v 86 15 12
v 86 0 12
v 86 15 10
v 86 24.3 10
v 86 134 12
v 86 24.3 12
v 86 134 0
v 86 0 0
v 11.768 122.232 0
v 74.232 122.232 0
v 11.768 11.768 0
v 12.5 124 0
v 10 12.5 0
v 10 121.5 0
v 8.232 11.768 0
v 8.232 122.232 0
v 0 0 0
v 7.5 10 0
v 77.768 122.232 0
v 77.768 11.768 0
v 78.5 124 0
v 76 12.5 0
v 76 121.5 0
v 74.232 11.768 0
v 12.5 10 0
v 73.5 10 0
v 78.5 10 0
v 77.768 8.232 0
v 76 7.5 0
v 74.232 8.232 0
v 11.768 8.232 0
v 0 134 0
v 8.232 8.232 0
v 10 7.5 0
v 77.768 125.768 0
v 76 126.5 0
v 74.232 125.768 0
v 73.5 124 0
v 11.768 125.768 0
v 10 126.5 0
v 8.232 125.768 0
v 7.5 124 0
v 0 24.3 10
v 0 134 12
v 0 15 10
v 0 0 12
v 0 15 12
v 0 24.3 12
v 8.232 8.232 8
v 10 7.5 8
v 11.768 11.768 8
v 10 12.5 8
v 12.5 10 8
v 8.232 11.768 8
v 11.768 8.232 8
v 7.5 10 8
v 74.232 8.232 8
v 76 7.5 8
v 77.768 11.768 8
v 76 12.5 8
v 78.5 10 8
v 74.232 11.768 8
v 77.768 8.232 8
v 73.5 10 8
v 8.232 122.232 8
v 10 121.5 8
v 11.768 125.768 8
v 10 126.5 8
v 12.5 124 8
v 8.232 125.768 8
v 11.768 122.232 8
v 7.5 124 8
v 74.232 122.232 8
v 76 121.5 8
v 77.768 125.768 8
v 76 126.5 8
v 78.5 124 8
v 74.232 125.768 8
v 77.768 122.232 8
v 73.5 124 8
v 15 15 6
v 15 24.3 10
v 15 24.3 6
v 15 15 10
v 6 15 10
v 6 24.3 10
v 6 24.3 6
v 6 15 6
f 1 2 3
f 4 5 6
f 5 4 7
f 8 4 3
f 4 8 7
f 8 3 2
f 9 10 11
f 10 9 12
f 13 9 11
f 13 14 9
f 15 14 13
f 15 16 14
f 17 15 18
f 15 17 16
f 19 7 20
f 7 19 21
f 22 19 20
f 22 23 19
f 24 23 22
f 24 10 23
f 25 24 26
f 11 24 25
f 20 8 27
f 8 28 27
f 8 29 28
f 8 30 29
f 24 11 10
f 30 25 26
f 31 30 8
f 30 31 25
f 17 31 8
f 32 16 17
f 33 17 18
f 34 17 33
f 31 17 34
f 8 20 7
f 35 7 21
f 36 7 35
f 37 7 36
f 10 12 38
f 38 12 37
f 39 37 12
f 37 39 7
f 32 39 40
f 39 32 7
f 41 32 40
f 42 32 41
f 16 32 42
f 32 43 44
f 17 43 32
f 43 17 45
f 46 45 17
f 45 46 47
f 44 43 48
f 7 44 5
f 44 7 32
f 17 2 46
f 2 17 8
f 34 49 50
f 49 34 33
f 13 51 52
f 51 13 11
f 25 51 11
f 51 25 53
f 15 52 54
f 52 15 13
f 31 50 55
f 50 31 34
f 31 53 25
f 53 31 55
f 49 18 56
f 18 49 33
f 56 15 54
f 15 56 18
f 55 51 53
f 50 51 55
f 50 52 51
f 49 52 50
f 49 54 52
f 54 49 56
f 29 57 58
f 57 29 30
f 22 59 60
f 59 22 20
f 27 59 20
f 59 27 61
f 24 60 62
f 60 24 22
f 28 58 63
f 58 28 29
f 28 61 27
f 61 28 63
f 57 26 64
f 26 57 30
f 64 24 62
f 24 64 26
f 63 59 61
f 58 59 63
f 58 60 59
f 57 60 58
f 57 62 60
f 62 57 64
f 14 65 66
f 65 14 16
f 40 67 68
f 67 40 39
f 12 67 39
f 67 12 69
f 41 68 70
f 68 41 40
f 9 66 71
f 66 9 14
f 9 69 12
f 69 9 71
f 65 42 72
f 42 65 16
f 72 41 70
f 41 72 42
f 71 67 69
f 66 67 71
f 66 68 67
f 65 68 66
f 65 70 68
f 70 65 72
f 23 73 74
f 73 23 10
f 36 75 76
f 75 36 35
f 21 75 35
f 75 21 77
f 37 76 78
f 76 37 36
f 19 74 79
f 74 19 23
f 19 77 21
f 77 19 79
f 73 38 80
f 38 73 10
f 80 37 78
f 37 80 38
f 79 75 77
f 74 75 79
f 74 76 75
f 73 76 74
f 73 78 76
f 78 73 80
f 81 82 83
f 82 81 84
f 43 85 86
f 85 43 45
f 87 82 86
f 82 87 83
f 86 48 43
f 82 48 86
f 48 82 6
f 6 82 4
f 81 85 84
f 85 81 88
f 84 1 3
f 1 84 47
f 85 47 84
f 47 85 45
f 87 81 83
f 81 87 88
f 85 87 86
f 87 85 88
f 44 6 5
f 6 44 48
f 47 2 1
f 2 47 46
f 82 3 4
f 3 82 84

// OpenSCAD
// file: speaker_cabinet.scad
u=12;
margin=5;
border=2;

difference() {
    union() {
        cube([u*6+margin*2+border*2,u*10+margin*2+border*2,50]);
    };
    
    //main cutout
    translate([3,3,22]) {
        cube([u*6+margin*2+border*2-6,u*10+margin*2+border*2-6,28]);
    };
    
    //speaker stands
    translate([(87-58)/2,(134-58)/2,17]) {
        cylinder(h=8, d=5);
    }
    translate([(87-58)/2+58,(134-58)/2,17]) {
        cylinder(h=8, d=5);
    }
    translate([(87-58)/2,(134-58)/2+58,17]) {
        cylinder(h=8, d=5);
    }
    translate([(87-58)/2+58,(134-58)/2+58,17]) {
        cylinder(h=8, d=5);
    }    
    
    //back mounting bracket
    translate([10,10,0]) {
        cylinder(h=8, d=5);
    }
    translate([u*6+margin*2+border*2-10,10,0]) {
        cylinder(h=8, d=5);
    }
    translate([10,u*10+margin*2+border*2-10,0]) {
        cylinder(h=8, d=5);
    }
    translate([u*6+margin*2+border*2-10,u*10+margin*2+border*2-10,0]) {
        cylinder(h=8, d=5);
    }
    
    //power cutout
    translate([0,15,10]) {
        cube([15,9.3,11.2]);        
    }    
    //power cutout pins
    translate([6,15,6]) {
        cube([9,9.3,4]);
    }    
    //power cable run
    translate([15,15,10]) {
        cube([86-14.5,9.3,2]);        
    }    
    
    //speaker magnet
    translate([87/2-33/2+16,134/2-33/2+16,12]) {
        cylinder(h=10,d=33);
    }
    
    //speaker wire conduit
    translate([u*6+margin*2+border*2-5,134/2,30]) {
        rotate(90,[0,1,0]) {
            cylinder(h=15,d=4);
        }
    }
};

// speaker stand 4mm diameter, 58mm apart
//87x134mm
// main file
difference() {
    include <speaker_cabinet.scad>;
    translate([-1,-1,12]) {
        cube(200);
    };
}
